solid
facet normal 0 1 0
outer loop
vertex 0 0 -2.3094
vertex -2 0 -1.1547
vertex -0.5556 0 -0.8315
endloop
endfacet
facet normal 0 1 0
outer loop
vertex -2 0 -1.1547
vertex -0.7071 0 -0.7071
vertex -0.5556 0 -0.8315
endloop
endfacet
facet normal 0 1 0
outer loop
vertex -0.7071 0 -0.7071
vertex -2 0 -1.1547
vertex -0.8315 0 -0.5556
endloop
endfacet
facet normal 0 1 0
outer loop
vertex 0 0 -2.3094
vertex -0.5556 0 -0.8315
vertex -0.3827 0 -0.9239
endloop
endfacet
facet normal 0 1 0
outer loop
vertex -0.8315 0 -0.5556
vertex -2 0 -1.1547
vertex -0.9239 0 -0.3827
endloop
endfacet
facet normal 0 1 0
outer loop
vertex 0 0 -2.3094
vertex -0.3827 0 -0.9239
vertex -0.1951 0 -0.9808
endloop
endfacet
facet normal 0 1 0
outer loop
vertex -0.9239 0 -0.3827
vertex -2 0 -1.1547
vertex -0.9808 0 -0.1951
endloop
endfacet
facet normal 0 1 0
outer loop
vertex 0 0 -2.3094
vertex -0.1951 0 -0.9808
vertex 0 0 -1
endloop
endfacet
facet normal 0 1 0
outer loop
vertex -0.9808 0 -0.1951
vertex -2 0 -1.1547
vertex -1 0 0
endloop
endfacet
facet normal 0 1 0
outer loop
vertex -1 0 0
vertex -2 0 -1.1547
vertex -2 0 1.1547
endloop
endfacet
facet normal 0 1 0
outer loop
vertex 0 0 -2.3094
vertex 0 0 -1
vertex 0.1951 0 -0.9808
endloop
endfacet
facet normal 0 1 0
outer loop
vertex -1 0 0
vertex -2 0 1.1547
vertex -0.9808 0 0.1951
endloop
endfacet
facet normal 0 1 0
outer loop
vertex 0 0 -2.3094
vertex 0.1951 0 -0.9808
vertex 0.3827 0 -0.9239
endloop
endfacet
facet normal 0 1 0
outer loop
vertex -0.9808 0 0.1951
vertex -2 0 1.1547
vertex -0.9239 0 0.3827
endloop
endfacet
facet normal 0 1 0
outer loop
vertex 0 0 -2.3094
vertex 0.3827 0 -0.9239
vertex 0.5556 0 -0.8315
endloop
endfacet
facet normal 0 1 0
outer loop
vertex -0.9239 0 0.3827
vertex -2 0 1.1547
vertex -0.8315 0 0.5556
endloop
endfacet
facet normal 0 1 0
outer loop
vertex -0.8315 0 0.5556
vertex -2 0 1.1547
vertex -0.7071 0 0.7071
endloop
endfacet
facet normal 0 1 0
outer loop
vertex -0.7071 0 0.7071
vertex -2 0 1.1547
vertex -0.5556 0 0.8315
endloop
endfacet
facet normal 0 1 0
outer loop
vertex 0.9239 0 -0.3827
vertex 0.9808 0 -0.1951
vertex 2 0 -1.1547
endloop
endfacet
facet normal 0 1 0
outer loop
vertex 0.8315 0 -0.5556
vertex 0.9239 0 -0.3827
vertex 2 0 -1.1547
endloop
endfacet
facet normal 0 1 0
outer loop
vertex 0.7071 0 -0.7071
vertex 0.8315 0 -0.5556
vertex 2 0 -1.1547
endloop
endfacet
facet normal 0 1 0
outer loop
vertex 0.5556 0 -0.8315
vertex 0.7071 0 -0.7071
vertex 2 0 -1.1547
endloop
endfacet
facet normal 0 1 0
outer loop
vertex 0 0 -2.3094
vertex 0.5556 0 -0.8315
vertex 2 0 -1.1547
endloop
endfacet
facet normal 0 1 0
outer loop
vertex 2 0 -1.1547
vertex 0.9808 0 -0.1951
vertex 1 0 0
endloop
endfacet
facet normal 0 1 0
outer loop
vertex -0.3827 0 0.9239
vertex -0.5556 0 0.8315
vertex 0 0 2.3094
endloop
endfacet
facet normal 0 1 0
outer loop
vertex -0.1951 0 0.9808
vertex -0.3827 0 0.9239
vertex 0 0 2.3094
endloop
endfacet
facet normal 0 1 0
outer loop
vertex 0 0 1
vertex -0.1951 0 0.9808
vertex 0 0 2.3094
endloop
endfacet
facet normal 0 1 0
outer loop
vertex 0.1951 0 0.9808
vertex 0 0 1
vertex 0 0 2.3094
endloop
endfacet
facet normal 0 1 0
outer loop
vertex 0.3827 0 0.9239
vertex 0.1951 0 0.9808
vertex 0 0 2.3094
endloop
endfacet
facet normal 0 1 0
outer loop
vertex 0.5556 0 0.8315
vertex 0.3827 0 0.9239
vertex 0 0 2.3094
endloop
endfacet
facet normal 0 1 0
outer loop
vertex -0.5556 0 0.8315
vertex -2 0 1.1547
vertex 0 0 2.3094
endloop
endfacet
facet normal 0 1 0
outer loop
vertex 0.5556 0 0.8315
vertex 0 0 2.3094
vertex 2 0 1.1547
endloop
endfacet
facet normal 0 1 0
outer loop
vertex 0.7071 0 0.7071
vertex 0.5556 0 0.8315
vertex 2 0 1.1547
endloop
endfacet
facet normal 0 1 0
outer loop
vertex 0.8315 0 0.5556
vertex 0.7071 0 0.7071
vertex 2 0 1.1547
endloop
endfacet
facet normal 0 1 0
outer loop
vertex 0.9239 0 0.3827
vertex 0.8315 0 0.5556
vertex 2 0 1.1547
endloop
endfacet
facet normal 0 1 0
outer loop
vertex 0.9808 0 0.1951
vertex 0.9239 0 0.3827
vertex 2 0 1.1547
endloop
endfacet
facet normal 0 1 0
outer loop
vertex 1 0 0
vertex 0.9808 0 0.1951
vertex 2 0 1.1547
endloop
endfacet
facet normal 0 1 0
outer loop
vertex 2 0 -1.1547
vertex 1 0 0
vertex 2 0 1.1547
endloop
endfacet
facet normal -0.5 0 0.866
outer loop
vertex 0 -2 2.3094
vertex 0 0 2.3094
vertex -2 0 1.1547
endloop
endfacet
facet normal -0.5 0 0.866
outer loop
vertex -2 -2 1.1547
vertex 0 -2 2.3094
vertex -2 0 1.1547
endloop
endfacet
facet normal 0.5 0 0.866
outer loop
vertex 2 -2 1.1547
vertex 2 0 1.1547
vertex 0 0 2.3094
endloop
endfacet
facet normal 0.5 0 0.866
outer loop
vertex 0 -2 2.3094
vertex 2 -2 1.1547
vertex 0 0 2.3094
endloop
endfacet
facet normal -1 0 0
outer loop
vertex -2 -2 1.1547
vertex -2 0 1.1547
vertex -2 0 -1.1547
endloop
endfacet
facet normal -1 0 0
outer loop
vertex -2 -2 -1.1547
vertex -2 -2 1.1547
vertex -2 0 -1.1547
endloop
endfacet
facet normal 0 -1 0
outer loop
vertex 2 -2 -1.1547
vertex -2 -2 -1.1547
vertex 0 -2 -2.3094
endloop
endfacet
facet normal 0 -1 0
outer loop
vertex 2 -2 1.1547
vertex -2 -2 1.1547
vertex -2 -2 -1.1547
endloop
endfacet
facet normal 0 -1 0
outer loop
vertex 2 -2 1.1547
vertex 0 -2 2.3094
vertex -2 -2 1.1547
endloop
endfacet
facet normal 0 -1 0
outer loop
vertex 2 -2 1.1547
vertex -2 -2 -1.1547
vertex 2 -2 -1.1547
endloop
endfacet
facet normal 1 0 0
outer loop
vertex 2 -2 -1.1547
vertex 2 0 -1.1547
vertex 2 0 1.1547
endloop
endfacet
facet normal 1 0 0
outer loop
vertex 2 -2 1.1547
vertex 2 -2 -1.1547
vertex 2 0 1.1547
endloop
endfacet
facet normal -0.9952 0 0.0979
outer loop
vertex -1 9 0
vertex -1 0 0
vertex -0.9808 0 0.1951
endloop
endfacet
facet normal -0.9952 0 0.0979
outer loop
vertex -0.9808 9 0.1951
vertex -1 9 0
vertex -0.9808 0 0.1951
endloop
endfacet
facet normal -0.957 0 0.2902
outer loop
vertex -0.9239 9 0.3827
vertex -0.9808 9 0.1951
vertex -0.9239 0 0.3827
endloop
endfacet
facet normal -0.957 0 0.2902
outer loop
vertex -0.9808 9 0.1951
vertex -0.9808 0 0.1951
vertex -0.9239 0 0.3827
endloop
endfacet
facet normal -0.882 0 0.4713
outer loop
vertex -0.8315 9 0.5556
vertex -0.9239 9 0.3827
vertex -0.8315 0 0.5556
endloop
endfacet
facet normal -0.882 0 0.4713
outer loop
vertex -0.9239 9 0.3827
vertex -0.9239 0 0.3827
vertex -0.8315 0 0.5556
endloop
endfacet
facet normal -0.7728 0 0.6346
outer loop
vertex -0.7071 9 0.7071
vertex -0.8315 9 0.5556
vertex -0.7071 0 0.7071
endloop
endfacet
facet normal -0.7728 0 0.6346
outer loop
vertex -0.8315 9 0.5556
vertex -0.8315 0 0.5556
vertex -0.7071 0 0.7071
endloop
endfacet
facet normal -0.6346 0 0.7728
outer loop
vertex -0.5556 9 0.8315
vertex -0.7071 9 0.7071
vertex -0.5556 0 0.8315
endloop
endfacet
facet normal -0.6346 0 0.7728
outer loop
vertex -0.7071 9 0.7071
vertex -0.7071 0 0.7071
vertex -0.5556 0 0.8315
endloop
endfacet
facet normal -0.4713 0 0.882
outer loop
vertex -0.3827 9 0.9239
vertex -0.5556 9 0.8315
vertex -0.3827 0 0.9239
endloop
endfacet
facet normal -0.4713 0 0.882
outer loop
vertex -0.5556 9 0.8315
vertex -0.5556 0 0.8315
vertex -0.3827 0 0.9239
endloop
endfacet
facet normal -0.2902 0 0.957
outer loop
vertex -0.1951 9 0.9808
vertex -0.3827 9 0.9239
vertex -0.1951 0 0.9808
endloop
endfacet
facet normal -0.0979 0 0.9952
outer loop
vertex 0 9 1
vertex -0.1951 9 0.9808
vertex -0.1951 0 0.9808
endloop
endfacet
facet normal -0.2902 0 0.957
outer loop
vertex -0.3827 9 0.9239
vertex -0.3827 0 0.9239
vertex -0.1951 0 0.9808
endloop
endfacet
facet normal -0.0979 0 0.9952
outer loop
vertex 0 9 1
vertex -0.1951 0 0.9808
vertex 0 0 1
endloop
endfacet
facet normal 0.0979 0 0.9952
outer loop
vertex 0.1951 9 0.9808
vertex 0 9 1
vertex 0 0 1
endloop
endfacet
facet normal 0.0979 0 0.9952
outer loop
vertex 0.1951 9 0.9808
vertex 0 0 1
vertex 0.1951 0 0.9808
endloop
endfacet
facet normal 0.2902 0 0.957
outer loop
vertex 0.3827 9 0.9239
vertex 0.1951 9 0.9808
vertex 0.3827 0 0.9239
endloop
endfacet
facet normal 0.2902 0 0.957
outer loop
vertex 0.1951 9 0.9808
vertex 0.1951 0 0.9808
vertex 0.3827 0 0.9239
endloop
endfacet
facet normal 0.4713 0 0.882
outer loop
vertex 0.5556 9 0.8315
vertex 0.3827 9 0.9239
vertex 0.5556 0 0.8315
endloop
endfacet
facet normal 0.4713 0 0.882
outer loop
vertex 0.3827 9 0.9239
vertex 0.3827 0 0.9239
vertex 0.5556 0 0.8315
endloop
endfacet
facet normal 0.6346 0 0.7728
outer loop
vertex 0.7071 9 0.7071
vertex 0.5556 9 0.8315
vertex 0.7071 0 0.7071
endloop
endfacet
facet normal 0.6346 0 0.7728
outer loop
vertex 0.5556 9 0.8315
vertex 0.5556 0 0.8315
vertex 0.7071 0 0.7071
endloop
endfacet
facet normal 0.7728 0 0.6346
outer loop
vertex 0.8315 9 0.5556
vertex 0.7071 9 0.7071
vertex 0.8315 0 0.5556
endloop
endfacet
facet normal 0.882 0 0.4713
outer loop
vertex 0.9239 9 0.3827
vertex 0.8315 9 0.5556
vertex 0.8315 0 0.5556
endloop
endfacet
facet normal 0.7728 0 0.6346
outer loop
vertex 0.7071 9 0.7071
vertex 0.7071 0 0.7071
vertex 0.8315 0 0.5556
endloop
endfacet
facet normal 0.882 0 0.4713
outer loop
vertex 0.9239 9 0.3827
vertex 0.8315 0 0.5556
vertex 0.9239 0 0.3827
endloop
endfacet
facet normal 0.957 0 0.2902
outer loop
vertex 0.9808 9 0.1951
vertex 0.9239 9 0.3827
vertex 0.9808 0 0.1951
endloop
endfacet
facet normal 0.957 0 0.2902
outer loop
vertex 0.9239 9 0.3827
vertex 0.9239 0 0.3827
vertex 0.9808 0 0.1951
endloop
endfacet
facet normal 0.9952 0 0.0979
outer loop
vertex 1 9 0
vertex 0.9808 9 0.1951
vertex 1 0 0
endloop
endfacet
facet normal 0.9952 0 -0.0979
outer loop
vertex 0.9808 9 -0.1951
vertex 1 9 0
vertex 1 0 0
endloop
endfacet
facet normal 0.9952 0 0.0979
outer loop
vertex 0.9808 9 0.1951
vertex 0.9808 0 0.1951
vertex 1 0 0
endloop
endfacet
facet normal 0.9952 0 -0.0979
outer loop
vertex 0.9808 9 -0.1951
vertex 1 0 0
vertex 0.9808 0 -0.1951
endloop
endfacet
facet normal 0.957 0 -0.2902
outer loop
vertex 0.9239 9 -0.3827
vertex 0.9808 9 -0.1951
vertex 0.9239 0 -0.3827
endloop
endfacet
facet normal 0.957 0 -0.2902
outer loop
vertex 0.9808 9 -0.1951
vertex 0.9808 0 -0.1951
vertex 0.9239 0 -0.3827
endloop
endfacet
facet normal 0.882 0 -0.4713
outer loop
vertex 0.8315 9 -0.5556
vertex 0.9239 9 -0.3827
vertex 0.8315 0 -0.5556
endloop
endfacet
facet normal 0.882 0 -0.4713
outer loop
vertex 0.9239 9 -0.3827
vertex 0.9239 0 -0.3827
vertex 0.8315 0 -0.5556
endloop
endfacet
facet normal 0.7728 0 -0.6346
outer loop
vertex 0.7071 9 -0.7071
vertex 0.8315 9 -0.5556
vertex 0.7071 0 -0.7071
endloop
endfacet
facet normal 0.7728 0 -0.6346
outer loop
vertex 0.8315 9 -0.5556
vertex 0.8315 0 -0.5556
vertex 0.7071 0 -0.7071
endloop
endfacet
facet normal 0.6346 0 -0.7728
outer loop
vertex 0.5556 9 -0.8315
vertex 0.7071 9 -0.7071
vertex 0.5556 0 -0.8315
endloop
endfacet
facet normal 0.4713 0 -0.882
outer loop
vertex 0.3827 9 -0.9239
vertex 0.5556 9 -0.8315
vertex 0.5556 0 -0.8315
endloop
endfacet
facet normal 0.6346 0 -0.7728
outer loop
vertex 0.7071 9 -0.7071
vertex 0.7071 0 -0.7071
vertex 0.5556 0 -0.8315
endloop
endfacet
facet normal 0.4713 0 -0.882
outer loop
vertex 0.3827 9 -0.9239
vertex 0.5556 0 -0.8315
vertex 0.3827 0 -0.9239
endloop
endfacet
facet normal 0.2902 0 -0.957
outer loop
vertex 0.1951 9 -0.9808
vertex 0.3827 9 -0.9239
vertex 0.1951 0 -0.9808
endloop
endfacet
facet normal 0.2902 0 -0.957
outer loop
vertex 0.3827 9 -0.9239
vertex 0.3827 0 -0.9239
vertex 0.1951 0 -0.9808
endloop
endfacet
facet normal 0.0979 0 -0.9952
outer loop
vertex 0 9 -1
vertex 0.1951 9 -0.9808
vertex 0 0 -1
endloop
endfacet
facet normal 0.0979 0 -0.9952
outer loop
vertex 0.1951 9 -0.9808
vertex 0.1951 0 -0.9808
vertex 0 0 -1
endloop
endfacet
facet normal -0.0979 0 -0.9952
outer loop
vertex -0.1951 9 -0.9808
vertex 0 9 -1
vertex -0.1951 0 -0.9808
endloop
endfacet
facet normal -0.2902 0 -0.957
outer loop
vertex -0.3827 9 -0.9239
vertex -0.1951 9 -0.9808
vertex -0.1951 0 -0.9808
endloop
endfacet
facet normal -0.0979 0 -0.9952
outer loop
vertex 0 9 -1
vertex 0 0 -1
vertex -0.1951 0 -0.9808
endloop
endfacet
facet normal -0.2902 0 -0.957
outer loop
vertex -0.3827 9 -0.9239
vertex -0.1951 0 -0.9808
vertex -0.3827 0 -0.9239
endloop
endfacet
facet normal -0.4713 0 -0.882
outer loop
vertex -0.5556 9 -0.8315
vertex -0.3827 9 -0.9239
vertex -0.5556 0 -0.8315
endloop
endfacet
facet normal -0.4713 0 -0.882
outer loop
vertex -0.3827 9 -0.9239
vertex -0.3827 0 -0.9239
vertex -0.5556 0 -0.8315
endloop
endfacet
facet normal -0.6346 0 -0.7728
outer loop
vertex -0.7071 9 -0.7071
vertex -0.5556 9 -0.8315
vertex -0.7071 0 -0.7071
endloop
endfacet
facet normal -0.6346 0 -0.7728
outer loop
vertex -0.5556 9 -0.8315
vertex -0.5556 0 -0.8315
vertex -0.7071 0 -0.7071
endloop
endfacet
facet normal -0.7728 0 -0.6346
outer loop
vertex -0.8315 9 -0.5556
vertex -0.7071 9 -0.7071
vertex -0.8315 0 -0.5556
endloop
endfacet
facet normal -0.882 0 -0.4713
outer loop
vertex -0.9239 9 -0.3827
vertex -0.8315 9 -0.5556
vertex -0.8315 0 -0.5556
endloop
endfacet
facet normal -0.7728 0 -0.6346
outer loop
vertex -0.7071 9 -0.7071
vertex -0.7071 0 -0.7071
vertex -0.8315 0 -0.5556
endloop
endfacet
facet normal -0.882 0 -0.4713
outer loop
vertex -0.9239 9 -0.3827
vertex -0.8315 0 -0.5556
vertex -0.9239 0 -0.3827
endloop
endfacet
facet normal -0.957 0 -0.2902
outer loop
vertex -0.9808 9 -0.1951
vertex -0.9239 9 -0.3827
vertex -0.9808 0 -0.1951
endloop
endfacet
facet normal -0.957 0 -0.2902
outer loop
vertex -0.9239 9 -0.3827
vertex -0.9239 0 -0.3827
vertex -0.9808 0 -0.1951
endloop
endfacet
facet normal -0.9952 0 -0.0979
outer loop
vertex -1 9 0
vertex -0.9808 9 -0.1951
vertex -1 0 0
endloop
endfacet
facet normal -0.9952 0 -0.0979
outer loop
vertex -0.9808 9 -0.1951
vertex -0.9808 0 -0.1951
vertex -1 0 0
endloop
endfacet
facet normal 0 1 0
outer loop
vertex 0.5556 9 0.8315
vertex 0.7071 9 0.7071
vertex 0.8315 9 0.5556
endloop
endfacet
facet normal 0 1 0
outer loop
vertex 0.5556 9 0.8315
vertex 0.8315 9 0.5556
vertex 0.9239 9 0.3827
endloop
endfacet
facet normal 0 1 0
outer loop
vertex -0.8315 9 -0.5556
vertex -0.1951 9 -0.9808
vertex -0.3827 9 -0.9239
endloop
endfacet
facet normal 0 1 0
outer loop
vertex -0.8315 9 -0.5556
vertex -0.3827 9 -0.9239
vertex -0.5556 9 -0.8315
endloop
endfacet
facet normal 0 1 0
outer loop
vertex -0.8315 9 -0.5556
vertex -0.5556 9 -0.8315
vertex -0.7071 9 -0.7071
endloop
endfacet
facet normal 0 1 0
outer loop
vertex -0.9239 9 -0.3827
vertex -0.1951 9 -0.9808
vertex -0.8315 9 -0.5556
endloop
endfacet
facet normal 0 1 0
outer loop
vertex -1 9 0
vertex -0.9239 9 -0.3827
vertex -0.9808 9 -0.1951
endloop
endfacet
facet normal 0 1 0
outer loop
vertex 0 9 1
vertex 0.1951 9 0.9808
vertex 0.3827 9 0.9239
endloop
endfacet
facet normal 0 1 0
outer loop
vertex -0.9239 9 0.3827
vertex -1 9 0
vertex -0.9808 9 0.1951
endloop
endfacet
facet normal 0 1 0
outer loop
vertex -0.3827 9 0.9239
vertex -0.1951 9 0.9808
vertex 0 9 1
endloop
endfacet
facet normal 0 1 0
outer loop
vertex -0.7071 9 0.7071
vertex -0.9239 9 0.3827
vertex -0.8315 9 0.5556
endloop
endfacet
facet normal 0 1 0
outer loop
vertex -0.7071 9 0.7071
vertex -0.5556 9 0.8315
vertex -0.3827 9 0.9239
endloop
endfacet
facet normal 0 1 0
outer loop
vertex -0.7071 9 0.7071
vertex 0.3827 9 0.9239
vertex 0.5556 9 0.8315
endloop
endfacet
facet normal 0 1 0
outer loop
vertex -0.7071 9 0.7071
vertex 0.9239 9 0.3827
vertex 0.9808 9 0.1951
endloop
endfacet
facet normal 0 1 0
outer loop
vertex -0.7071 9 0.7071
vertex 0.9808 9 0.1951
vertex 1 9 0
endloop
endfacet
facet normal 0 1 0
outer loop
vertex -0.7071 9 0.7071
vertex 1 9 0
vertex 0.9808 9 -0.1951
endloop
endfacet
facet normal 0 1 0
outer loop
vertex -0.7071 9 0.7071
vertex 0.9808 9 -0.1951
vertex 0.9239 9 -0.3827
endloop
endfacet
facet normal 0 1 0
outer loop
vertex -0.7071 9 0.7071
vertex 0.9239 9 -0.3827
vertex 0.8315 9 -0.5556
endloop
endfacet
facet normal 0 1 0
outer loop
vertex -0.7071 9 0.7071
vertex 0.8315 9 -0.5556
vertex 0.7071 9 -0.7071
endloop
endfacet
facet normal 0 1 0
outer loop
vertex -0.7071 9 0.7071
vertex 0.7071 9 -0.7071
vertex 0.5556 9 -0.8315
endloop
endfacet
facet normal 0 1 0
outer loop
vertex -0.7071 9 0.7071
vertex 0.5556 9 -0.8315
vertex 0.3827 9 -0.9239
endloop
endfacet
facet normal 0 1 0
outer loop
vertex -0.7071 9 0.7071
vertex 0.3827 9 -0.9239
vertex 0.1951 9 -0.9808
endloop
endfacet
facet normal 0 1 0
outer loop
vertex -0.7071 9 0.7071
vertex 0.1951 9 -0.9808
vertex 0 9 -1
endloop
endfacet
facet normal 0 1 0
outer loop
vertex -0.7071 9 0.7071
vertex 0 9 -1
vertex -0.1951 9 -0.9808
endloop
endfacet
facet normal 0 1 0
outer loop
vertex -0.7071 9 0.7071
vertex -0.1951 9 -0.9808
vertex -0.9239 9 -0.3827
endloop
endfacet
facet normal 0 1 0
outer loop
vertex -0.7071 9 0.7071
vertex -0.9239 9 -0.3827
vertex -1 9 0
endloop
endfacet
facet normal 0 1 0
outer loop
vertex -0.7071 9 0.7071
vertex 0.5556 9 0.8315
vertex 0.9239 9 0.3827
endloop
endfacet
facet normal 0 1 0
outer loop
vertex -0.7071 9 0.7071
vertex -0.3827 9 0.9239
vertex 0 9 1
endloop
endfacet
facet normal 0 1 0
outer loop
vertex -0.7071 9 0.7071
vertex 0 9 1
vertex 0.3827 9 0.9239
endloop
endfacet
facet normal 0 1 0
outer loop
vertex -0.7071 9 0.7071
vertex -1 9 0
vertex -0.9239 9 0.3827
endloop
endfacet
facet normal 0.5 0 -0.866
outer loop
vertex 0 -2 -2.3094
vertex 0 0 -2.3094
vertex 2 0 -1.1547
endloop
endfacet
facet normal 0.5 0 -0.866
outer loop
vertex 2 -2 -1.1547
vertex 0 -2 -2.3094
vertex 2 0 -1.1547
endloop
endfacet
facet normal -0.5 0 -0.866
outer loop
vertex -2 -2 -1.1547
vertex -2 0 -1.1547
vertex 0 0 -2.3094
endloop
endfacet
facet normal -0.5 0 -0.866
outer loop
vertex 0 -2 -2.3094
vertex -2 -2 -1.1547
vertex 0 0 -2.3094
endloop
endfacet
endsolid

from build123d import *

# Parameters (mm, degrees)
F0_R     = 1
F1_DEPTH = 2
F2_R     = 1
F3_DEPTH = 9


# Not quite as in the source:
# - a feature of the source that left no trace in its solid (it failed there, or was rolled back) is left out


with BuildPart() as f1:
    # F0 (on Front) → F1 (new body)
    with BuildSketch(Plane.XZ):
        Polygon((-2, 1.1547005384), (-2, -1.1547005384), (0, -2.3094010768), (2, -1.1547005384), (2, 1.1547005384), (0, 2.3094010768), align=None)
        Circle(F0_R, mode=Mode.SUBTRACT)
        Circle(F0_R)
    extrude(amount=F1_DEPTH)

    # F2 (on face) → F3 (join)
    with BuildSketch(Plane(origin=(0, 0, 0), x_dir=(-1, 0, 0), z_dir=(0, 1, 0))):
        Circle(F2_R)
    extrude(amount=F3_DEPTH)


solid = f1.part
